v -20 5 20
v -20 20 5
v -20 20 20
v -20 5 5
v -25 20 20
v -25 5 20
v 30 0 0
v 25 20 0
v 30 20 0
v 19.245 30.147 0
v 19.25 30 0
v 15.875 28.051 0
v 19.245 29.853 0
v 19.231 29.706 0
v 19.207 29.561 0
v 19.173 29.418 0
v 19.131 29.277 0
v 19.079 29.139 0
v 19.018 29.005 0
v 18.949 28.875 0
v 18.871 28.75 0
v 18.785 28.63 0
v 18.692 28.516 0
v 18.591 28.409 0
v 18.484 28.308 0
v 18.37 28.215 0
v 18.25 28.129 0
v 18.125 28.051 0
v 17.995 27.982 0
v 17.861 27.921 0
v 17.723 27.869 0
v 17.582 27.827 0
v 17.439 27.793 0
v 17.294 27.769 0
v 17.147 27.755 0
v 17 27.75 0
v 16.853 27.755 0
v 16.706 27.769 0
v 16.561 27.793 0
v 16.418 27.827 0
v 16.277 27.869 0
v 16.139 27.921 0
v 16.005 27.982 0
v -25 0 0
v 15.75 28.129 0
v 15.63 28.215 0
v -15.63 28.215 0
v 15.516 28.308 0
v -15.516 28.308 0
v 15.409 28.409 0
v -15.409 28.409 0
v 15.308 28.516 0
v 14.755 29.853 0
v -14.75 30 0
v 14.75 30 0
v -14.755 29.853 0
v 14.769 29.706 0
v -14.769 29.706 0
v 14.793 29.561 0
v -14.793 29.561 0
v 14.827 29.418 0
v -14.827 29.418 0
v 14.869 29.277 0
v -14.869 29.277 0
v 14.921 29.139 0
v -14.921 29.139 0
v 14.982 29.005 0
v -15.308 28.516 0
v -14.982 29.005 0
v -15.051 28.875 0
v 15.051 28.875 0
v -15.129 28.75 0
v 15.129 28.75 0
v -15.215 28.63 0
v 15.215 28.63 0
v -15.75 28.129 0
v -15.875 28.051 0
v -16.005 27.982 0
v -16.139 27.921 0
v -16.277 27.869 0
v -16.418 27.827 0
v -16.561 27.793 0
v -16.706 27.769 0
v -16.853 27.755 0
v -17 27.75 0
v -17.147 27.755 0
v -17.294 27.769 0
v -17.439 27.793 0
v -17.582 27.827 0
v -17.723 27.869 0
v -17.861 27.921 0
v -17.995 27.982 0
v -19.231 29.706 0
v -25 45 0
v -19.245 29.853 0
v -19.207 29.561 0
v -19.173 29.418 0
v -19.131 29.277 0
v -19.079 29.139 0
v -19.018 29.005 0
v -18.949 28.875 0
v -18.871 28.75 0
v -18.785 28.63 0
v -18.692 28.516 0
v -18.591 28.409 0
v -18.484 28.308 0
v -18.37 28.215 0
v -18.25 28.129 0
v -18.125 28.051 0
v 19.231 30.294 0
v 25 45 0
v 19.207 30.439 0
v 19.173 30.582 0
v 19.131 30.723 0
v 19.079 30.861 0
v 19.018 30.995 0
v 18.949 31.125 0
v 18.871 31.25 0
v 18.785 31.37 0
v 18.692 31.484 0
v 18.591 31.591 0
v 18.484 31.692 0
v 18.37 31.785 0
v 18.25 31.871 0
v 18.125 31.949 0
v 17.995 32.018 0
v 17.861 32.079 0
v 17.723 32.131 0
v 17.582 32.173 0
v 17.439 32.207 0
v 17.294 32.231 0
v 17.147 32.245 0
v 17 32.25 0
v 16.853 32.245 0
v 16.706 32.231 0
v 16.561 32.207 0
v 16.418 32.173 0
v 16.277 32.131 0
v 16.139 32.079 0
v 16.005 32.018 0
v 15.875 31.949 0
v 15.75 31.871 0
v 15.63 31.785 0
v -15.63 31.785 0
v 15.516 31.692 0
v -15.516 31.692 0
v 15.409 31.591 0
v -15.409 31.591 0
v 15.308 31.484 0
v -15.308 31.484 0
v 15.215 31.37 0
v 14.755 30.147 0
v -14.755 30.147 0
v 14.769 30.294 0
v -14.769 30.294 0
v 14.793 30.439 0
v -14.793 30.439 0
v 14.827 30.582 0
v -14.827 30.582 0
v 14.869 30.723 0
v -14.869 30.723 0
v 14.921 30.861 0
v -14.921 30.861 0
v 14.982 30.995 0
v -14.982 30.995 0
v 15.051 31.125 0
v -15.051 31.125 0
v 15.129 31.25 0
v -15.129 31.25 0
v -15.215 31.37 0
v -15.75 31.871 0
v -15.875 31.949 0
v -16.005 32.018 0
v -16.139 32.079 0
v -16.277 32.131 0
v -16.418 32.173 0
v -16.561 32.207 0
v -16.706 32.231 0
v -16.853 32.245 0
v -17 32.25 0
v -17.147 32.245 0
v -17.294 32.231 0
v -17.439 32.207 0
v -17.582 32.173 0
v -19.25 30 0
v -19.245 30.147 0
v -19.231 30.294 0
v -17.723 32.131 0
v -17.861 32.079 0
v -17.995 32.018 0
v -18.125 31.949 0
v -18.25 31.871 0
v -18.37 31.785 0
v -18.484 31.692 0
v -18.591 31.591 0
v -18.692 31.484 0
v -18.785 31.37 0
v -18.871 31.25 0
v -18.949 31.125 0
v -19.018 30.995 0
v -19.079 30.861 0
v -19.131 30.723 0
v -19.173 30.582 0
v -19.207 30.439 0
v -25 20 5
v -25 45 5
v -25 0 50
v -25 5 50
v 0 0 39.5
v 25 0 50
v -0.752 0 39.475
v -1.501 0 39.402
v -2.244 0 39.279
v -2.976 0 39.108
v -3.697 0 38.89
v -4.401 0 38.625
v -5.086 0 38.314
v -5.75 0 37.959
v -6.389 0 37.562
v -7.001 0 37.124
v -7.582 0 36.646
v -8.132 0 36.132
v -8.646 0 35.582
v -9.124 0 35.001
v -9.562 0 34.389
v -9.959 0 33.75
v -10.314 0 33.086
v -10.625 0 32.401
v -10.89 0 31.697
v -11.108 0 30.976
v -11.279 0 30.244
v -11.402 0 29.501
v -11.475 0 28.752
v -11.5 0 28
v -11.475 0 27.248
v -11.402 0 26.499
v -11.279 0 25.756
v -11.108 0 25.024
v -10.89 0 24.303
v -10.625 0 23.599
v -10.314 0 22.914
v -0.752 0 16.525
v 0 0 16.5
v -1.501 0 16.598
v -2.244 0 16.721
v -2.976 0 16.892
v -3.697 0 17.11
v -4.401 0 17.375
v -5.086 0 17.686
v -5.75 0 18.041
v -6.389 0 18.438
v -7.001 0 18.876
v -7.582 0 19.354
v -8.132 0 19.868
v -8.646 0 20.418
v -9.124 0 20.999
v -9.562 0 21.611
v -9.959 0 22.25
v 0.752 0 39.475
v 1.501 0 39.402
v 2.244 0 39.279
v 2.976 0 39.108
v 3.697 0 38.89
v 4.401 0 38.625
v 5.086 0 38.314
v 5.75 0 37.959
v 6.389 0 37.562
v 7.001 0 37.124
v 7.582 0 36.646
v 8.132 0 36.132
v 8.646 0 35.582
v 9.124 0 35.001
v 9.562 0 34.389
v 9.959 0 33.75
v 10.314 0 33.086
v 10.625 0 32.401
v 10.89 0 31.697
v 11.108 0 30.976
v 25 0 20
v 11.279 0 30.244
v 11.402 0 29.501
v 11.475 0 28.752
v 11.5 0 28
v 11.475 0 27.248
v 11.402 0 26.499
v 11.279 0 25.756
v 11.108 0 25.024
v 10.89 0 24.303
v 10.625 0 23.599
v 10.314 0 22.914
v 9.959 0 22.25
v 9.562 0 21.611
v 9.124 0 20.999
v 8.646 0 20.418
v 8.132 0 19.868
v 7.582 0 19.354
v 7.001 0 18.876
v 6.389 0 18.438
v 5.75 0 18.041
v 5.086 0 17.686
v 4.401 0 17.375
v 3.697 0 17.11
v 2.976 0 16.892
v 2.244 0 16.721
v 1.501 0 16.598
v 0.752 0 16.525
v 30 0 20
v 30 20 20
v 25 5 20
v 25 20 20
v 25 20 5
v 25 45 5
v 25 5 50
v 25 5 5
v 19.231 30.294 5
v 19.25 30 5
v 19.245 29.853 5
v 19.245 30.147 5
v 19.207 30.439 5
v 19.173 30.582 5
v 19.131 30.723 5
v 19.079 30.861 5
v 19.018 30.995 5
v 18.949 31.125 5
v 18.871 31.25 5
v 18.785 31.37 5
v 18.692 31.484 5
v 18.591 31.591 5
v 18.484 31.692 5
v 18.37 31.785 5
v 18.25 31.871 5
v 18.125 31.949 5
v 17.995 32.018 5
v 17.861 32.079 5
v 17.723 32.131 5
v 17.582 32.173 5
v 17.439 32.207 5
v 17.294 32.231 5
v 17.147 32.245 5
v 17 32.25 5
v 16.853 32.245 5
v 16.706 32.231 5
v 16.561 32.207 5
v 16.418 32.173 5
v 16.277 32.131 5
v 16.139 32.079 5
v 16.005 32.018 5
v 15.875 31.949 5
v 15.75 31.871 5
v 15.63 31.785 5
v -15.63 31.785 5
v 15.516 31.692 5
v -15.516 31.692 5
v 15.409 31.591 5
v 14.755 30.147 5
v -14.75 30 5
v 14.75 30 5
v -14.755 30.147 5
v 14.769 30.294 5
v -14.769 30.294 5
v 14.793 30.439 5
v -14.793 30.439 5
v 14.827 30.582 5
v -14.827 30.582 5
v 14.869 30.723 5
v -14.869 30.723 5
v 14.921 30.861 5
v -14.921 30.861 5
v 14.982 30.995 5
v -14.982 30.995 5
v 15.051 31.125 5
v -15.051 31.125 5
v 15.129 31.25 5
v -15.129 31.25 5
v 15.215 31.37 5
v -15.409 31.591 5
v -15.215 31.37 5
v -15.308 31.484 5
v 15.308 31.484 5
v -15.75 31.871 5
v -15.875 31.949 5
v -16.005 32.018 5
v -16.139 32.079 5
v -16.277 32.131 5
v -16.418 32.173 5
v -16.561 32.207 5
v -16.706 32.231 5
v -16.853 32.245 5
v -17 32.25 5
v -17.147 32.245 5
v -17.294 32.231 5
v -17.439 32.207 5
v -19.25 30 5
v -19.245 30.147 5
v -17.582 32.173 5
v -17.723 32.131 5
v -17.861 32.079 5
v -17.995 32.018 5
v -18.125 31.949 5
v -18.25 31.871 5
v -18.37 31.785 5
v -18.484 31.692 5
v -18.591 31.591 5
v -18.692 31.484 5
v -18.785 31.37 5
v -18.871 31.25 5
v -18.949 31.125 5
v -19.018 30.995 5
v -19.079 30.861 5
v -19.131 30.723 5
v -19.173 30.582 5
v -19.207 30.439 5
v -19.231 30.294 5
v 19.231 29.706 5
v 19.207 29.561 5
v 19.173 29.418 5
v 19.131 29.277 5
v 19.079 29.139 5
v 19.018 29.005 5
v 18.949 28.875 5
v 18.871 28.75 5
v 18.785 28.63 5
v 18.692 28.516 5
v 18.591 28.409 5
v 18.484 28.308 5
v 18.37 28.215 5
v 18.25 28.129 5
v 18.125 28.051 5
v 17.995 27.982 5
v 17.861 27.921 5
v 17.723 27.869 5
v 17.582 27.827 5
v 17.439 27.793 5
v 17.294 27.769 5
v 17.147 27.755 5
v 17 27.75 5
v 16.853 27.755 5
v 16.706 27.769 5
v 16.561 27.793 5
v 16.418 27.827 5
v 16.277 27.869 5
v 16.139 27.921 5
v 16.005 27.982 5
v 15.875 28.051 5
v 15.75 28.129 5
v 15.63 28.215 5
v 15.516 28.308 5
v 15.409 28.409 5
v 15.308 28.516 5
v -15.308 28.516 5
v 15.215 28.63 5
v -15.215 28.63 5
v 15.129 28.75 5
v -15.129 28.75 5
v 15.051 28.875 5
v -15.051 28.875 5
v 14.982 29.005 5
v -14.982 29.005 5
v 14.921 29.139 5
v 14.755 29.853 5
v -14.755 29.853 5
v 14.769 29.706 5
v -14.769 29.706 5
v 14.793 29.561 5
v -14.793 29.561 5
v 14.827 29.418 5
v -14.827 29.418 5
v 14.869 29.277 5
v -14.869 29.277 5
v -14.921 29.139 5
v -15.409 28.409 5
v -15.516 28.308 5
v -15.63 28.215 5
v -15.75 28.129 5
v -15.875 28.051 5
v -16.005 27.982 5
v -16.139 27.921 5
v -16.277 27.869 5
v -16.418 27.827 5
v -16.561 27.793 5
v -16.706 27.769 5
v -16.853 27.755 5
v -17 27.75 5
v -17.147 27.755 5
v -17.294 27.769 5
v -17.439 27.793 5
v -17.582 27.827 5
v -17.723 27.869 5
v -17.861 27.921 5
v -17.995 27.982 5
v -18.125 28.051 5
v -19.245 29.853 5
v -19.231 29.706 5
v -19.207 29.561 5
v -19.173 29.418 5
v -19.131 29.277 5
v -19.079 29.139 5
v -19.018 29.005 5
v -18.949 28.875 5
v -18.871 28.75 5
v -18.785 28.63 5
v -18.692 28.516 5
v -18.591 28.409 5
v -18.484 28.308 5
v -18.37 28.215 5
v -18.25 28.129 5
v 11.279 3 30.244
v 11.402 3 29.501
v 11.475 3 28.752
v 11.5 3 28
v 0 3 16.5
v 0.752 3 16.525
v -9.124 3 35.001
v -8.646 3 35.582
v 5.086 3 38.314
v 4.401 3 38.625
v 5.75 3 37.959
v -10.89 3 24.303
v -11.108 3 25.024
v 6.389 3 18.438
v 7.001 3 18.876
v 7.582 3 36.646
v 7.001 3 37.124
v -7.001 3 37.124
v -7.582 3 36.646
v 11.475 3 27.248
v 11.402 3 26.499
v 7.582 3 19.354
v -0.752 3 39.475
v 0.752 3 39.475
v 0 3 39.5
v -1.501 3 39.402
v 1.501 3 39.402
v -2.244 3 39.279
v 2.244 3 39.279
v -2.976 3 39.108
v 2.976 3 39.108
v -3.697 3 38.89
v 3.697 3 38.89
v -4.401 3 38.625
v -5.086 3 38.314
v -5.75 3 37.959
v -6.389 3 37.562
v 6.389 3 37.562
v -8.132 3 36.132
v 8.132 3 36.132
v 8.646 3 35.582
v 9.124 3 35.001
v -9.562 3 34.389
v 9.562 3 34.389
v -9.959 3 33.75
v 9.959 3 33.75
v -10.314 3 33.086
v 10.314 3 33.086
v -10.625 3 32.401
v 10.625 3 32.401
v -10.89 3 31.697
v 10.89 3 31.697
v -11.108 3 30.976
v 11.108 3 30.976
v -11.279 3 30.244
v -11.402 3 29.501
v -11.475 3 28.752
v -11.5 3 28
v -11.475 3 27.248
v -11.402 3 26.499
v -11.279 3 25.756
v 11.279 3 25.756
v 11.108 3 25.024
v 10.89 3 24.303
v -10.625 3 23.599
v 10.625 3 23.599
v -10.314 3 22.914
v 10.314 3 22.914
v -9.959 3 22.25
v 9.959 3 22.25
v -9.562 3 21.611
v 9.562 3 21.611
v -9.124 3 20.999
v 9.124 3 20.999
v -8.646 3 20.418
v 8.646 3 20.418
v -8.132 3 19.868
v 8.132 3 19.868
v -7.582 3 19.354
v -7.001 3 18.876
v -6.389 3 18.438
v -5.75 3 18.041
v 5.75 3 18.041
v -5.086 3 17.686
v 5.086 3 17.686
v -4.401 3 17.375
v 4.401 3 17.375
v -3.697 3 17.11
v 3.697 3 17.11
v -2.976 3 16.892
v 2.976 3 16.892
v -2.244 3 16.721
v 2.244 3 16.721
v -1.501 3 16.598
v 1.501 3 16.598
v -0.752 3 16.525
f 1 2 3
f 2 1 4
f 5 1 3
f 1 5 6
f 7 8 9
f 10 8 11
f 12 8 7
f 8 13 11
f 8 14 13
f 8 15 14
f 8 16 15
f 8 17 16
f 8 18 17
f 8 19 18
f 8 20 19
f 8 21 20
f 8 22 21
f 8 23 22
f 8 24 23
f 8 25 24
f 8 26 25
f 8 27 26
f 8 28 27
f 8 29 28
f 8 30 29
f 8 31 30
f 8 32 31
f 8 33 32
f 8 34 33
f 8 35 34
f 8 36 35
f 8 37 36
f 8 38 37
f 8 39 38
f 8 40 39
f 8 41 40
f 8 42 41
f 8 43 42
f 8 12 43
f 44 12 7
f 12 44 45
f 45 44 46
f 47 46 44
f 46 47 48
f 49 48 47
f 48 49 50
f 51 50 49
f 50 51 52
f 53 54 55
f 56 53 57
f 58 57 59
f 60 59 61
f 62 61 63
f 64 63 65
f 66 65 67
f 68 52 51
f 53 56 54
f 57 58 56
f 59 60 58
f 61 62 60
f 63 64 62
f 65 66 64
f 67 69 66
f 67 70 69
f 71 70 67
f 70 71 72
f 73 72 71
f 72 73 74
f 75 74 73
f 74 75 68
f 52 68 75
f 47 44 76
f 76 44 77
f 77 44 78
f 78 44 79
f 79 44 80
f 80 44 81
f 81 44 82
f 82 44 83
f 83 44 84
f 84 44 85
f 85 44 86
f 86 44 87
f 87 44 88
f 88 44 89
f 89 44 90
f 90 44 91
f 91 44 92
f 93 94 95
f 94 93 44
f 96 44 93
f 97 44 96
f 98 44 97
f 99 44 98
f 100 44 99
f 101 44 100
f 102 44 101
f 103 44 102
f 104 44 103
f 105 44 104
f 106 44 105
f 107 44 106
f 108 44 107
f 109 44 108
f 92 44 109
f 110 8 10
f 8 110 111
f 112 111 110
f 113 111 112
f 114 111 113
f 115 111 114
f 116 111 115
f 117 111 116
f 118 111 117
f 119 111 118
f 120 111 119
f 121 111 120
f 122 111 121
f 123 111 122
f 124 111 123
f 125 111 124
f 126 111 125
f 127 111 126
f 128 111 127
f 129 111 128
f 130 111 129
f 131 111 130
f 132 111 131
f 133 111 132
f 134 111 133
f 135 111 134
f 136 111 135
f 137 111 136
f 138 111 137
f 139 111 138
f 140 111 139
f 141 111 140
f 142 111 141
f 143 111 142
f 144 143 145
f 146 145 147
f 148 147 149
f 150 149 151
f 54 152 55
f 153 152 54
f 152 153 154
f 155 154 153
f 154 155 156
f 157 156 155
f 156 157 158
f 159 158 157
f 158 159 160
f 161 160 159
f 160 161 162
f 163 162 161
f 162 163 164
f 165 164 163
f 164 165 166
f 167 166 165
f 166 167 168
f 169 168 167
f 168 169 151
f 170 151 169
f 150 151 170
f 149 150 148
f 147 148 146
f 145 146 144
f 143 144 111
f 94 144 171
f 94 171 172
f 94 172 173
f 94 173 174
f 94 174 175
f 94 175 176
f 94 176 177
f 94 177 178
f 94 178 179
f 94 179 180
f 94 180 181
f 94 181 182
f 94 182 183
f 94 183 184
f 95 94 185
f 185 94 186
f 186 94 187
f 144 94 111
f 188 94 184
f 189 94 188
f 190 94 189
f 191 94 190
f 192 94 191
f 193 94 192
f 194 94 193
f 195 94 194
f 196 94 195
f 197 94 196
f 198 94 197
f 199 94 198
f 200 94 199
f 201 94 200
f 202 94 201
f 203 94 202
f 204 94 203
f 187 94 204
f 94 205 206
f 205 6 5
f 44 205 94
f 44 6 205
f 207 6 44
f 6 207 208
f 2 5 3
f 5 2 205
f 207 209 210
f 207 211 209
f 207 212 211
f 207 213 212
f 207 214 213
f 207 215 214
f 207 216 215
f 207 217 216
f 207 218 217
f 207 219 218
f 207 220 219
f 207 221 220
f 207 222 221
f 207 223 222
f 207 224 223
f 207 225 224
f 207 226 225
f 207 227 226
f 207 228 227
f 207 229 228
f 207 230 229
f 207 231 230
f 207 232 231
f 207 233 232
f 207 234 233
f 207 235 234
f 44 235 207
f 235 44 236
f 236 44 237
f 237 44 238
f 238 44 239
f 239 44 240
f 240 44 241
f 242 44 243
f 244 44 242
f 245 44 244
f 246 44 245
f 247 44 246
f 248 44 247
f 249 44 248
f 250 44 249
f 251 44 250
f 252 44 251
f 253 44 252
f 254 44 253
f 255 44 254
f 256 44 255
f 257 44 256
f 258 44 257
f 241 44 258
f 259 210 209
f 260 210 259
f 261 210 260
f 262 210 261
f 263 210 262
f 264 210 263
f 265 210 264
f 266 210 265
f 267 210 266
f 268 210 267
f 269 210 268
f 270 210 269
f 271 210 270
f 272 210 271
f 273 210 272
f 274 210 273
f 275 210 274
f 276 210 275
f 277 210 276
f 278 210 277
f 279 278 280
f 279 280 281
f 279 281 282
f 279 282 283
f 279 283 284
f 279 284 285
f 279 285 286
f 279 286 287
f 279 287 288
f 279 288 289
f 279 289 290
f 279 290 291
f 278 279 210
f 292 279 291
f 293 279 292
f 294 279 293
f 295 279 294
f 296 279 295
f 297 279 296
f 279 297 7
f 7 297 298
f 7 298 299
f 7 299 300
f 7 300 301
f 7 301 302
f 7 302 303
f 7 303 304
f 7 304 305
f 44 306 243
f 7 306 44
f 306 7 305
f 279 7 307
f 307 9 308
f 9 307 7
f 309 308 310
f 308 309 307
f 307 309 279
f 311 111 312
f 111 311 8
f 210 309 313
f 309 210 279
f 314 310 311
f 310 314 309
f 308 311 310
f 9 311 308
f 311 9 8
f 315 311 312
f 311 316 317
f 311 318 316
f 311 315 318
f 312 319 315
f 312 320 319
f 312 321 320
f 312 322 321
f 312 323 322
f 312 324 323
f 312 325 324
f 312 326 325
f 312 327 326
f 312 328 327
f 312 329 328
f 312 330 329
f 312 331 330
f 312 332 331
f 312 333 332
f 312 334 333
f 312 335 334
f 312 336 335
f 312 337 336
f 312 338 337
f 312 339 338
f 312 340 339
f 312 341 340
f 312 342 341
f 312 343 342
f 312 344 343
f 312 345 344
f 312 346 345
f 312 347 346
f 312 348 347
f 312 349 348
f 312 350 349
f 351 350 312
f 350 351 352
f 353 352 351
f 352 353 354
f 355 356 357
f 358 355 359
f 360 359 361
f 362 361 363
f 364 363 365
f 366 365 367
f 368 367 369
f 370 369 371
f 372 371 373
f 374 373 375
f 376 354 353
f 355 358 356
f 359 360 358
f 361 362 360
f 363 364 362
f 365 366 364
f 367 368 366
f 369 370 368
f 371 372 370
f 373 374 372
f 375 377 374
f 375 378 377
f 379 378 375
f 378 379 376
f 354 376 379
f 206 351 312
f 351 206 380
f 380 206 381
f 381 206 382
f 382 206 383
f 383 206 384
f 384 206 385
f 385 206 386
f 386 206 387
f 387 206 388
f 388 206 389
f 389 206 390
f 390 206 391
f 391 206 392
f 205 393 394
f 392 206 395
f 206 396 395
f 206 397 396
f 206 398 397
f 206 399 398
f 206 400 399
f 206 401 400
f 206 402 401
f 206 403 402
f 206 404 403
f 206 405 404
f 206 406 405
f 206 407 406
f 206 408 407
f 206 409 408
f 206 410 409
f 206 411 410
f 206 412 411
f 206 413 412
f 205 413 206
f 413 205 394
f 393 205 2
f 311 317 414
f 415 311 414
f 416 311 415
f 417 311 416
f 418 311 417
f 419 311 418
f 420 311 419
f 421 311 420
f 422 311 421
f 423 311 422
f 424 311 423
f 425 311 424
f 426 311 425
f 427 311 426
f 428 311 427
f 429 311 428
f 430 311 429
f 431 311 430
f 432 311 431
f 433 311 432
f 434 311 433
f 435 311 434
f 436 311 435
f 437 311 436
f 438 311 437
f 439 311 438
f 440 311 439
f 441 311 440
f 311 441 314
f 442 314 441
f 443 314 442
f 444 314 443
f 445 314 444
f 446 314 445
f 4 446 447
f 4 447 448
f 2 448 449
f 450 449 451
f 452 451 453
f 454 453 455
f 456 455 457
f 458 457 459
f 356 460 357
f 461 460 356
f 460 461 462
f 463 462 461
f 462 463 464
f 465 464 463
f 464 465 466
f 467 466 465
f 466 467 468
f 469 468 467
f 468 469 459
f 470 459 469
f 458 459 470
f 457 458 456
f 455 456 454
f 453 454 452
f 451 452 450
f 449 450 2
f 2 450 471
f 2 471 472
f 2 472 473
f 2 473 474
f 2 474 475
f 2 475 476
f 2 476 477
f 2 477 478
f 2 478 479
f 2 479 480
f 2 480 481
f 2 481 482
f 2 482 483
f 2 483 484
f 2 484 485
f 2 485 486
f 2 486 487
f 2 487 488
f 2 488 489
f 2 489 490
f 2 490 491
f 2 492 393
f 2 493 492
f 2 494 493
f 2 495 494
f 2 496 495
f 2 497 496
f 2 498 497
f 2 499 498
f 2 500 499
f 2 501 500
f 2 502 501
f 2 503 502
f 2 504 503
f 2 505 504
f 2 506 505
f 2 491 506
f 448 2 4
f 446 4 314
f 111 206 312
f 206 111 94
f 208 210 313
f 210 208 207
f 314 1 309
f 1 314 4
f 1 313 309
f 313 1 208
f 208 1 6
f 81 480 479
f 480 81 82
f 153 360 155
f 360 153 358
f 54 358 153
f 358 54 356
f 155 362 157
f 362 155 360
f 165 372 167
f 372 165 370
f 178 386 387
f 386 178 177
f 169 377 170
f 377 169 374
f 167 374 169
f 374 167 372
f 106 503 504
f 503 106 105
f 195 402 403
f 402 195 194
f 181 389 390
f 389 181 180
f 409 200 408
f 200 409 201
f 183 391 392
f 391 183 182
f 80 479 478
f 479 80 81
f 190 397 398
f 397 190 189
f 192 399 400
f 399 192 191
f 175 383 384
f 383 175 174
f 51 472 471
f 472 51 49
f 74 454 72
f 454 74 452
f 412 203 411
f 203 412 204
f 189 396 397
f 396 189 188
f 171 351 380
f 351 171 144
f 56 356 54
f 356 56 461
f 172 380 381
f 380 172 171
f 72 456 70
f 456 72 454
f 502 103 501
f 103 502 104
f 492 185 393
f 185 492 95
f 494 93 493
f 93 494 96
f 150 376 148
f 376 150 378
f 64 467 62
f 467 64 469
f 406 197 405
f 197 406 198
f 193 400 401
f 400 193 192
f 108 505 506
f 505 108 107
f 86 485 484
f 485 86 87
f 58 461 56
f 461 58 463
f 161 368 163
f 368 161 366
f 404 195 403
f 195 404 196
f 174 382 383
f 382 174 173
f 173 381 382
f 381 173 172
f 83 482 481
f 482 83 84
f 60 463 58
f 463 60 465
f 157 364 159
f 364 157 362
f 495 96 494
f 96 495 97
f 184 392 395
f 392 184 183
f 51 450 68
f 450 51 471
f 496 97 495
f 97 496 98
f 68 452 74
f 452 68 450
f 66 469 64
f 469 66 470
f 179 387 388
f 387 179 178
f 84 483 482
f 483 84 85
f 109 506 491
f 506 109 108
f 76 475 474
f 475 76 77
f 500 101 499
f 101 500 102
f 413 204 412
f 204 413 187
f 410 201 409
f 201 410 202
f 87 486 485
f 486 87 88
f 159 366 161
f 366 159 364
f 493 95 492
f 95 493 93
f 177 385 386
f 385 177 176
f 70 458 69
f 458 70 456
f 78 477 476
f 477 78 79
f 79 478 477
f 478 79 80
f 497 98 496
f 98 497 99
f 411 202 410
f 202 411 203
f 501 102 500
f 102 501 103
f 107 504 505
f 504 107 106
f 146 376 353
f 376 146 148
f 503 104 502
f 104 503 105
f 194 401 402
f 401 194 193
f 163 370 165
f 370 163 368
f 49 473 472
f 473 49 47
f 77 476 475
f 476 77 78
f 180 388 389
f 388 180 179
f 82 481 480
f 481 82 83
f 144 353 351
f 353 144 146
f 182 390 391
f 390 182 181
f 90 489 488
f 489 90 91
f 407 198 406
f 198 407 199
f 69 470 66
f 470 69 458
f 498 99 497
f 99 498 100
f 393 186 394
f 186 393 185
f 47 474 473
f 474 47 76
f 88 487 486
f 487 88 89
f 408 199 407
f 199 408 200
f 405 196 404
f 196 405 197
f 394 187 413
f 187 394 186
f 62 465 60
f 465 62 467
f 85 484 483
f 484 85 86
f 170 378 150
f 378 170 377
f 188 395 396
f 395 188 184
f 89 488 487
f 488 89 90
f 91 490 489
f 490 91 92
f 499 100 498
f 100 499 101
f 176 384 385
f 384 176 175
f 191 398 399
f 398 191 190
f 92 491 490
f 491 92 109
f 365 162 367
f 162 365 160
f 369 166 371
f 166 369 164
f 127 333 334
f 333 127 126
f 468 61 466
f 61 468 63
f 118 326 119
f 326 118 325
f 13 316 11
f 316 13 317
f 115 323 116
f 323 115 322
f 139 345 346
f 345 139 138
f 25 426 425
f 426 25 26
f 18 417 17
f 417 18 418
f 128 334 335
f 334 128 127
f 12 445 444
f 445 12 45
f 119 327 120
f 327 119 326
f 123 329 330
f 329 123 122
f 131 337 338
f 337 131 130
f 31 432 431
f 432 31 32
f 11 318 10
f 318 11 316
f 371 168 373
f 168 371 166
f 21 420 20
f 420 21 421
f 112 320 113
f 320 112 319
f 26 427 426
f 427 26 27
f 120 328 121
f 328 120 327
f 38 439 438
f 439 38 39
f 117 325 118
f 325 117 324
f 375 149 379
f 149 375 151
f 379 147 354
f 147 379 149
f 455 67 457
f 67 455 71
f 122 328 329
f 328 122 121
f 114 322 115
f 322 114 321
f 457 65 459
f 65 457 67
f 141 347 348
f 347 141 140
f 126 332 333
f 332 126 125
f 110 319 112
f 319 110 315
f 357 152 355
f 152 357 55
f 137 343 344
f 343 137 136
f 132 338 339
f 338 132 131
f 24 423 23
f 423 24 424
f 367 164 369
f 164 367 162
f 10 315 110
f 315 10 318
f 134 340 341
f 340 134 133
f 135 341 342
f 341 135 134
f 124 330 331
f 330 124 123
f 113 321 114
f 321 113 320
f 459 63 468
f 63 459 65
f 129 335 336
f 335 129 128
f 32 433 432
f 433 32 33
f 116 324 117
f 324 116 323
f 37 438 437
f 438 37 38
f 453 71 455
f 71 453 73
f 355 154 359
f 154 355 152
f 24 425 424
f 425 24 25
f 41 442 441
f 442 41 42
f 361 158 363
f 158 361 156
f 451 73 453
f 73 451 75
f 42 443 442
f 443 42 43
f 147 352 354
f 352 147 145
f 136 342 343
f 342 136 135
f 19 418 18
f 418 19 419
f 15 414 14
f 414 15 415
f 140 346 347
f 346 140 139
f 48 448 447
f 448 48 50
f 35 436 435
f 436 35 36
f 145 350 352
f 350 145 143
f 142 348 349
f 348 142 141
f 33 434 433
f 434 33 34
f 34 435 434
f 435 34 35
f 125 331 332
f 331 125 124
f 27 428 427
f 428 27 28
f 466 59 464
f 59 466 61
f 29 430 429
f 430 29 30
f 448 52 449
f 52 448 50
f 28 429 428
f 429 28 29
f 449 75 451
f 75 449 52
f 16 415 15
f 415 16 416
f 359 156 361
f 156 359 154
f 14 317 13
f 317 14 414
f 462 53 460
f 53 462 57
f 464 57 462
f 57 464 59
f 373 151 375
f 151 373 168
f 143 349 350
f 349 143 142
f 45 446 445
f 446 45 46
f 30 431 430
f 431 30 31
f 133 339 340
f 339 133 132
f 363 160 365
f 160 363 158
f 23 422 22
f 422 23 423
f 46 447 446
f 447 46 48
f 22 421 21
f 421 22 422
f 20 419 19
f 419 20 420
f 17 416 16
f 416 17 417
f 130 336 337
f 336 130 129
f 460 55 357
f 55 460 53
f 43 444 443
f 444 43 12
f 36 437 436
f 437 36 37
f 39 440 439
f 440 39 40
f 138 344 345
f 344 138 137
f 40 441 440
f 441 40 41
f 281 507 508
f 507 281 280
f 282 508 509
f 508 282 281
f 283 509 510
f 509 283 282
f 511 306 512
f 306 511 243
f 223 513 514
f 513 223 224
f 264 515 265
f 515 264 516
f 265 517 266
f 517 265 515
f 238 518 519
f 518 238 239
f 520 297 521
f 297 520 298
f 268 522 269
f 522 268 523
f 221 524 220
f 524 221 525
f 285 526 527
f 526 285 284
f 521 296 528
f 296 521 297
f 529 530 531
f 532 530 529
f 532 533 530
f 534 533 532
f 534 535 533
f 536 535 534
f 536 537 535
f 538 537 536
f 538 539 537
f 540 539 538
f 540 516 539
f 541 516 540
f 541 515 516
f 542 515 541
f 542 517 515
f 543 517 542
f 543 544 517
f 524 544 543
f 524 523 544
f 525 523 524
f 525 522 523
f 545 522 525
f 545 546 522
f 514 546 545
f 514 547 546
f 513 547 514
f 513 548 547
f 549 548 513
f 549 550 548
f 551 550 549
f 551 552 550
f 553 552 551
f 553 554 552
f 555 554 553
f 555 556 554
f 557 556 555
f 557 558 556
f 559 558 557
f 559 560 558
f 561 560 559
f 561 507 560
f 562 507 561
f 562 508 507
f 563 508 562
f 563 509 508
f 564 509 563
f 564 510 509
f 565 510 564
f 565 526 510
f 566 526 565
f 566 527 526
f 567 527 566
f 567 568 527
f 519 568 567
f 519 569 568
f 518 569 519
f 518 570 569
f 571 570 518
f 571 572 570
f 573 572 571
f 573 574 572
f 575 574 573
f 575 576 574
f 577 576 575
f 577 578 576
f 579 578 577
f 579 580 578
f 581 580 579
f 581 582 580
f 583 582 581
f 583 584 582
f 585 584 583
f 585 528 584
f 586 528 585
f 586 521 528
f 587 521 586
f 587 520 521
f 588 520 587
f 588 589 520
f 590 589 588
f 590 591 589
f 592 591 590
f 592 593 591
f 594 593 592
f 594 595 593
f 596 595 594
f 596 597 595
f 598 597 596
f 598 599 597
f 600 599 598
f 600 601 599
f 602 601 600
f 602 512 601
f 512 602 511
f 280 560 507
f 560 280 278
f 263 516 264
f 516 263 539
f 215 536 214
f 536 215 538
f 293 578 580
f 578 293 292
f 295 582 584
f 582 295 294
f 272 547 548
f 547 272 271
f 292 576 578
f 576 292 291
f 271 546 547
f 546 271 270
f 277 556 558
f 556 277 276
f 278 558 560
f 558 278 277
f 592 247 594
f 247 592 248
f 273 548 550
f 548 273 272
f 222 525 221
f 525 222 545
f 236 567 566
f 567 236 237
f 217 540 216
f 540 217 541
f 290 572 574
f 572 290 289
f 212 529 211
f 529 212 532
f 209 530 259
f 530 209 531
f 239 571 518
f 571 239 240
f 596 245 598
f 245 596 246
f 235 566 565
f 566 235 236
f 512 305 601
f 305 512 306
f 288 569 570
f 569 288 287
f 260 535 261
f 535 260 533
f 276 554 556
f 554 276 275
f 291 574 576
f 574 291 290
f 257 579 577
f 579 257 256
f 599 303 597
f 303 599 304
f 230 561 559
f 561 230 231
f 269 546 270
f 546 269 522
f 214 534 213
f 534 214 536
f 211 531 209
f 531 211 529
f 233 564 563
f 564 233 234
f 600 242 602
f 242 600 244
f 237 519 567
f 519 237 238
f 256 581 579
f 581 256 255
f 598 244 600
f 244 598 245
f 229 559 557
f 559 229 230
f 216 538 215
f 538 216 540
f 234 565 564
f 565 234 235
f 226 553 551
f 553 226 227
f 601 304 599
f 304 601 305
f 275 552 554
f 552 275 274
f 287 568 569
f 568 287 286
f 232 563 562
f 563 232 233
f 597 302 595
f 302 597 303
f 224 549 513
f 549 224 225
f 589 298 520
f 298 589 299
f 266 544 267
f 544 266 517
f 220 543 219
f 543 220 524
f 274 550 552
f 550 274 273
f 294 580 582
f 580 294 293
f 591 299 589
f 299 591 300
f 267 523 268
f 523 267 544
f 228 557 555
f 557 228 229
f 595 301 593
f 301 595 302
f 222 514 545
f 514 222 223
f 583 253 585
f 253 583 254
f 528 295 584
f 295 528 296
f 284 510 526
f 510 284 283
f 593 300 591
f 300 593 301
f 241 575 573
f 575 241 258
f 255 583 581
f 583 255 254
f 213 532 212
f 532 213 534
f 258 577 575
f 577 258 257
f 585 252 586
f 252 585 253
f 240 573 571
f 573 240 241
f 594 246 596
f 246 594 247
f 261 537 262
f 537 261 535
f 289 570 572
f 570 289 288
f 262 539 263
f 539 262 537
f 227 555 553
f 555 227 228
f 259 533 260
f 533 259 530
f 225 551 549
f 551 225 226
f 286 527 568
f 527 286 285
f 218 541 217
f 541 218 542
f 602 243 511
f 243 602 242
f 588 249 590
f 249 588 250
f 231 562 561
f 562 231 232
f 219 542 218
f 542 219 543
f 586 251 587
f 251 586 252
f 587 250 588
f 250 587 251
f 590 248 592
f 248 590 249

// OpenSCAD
// L-shaped mounting bracket for NEMA 17 stepper motor (e.g. syringe pump)
// Print orientation: base plate on bed, motor plate building up in +Z

// ---------- Parameters ----------
base_x      = 25;    // base plate half-length in X
base_y      = 45;    // base plate length in Y
base_z      = 5;     // base plate thickness

hole_m4_x   = 17;    // M4 hole offset from centre in X (both holes)
hole_m4_y   = 30;    // M4 hole position in Y
hole_m4_d   = 4.5;   // M4 hole diameter

plate_z     = 50;    // motor plate height in Z
plate_y     = 5;     // motor plate thickness in Y

boss_d      = 23;    // motor boss hole diameter
boss_x      = 0;     // boss hole X position
boss_z      = 28;    // boss hole Z position

screw_d     = 3.4;   // M3 screw hole diameter
screw_n     = 4;     // number of screw holes
screw_p     = 31;    // square pattern side length for screw holes

gusset_t    = 5;     // gusset thickness in X
gusset_leg  = 20;    // gusset leg length in Y and Z
gusset_x0   = -25;   // left gusset start X
gusset_x1   = 25;    // right gusset start X

eps         = 0.5;   // cutter overshoot past faces
$fn         = 96;    // curve resolution

// ---------- Model ----------
difference() {
    union() {
        // Base plate
        translate([-base_x, 0, 0])
            cube([2*base_x, base_y, base_z]);

        // Motor plate (on back edge of base)
        translate([-base_x, 0, 0])
            cube([2*base_x, plate_y, plate_z]);

        // Gussets: right triangle in YZ plane, flush with outer edges
        for (sx = [gusset_x0, gusset_x1])
            translate([sx, 0, 0])
                cube([gusset_t, gusset_leg, gusset_leg]);
    }

    // M4 through-holes
    for (sx = [-hole_m4_x, hole_m4_x])
        translate([sx, hole_m4_y, -eps])
            cylinder(d = hole_m4_d, h = base_z + plate_z + 2*eps);

    // Motor boss hole (along Y)
    translate([boss_x, 0, boss_z])
        rotate([90, 0, 0])
            cylinder(d = boss_d, h = plate_y + 2*eps, center = true);

    // M3 screw holes on square pattern centred on boss hole
    for (i = [0 : screw_n - 1]) {
        a = screw_p / 2;
        translate([boss_x, 0, boss_z])
            rotate([0, 0, i * 90])
                translate([a, a, 0])
                    cylinder(d = screw_d, h = plate_y + 2*eps, center = true);
    }
}
